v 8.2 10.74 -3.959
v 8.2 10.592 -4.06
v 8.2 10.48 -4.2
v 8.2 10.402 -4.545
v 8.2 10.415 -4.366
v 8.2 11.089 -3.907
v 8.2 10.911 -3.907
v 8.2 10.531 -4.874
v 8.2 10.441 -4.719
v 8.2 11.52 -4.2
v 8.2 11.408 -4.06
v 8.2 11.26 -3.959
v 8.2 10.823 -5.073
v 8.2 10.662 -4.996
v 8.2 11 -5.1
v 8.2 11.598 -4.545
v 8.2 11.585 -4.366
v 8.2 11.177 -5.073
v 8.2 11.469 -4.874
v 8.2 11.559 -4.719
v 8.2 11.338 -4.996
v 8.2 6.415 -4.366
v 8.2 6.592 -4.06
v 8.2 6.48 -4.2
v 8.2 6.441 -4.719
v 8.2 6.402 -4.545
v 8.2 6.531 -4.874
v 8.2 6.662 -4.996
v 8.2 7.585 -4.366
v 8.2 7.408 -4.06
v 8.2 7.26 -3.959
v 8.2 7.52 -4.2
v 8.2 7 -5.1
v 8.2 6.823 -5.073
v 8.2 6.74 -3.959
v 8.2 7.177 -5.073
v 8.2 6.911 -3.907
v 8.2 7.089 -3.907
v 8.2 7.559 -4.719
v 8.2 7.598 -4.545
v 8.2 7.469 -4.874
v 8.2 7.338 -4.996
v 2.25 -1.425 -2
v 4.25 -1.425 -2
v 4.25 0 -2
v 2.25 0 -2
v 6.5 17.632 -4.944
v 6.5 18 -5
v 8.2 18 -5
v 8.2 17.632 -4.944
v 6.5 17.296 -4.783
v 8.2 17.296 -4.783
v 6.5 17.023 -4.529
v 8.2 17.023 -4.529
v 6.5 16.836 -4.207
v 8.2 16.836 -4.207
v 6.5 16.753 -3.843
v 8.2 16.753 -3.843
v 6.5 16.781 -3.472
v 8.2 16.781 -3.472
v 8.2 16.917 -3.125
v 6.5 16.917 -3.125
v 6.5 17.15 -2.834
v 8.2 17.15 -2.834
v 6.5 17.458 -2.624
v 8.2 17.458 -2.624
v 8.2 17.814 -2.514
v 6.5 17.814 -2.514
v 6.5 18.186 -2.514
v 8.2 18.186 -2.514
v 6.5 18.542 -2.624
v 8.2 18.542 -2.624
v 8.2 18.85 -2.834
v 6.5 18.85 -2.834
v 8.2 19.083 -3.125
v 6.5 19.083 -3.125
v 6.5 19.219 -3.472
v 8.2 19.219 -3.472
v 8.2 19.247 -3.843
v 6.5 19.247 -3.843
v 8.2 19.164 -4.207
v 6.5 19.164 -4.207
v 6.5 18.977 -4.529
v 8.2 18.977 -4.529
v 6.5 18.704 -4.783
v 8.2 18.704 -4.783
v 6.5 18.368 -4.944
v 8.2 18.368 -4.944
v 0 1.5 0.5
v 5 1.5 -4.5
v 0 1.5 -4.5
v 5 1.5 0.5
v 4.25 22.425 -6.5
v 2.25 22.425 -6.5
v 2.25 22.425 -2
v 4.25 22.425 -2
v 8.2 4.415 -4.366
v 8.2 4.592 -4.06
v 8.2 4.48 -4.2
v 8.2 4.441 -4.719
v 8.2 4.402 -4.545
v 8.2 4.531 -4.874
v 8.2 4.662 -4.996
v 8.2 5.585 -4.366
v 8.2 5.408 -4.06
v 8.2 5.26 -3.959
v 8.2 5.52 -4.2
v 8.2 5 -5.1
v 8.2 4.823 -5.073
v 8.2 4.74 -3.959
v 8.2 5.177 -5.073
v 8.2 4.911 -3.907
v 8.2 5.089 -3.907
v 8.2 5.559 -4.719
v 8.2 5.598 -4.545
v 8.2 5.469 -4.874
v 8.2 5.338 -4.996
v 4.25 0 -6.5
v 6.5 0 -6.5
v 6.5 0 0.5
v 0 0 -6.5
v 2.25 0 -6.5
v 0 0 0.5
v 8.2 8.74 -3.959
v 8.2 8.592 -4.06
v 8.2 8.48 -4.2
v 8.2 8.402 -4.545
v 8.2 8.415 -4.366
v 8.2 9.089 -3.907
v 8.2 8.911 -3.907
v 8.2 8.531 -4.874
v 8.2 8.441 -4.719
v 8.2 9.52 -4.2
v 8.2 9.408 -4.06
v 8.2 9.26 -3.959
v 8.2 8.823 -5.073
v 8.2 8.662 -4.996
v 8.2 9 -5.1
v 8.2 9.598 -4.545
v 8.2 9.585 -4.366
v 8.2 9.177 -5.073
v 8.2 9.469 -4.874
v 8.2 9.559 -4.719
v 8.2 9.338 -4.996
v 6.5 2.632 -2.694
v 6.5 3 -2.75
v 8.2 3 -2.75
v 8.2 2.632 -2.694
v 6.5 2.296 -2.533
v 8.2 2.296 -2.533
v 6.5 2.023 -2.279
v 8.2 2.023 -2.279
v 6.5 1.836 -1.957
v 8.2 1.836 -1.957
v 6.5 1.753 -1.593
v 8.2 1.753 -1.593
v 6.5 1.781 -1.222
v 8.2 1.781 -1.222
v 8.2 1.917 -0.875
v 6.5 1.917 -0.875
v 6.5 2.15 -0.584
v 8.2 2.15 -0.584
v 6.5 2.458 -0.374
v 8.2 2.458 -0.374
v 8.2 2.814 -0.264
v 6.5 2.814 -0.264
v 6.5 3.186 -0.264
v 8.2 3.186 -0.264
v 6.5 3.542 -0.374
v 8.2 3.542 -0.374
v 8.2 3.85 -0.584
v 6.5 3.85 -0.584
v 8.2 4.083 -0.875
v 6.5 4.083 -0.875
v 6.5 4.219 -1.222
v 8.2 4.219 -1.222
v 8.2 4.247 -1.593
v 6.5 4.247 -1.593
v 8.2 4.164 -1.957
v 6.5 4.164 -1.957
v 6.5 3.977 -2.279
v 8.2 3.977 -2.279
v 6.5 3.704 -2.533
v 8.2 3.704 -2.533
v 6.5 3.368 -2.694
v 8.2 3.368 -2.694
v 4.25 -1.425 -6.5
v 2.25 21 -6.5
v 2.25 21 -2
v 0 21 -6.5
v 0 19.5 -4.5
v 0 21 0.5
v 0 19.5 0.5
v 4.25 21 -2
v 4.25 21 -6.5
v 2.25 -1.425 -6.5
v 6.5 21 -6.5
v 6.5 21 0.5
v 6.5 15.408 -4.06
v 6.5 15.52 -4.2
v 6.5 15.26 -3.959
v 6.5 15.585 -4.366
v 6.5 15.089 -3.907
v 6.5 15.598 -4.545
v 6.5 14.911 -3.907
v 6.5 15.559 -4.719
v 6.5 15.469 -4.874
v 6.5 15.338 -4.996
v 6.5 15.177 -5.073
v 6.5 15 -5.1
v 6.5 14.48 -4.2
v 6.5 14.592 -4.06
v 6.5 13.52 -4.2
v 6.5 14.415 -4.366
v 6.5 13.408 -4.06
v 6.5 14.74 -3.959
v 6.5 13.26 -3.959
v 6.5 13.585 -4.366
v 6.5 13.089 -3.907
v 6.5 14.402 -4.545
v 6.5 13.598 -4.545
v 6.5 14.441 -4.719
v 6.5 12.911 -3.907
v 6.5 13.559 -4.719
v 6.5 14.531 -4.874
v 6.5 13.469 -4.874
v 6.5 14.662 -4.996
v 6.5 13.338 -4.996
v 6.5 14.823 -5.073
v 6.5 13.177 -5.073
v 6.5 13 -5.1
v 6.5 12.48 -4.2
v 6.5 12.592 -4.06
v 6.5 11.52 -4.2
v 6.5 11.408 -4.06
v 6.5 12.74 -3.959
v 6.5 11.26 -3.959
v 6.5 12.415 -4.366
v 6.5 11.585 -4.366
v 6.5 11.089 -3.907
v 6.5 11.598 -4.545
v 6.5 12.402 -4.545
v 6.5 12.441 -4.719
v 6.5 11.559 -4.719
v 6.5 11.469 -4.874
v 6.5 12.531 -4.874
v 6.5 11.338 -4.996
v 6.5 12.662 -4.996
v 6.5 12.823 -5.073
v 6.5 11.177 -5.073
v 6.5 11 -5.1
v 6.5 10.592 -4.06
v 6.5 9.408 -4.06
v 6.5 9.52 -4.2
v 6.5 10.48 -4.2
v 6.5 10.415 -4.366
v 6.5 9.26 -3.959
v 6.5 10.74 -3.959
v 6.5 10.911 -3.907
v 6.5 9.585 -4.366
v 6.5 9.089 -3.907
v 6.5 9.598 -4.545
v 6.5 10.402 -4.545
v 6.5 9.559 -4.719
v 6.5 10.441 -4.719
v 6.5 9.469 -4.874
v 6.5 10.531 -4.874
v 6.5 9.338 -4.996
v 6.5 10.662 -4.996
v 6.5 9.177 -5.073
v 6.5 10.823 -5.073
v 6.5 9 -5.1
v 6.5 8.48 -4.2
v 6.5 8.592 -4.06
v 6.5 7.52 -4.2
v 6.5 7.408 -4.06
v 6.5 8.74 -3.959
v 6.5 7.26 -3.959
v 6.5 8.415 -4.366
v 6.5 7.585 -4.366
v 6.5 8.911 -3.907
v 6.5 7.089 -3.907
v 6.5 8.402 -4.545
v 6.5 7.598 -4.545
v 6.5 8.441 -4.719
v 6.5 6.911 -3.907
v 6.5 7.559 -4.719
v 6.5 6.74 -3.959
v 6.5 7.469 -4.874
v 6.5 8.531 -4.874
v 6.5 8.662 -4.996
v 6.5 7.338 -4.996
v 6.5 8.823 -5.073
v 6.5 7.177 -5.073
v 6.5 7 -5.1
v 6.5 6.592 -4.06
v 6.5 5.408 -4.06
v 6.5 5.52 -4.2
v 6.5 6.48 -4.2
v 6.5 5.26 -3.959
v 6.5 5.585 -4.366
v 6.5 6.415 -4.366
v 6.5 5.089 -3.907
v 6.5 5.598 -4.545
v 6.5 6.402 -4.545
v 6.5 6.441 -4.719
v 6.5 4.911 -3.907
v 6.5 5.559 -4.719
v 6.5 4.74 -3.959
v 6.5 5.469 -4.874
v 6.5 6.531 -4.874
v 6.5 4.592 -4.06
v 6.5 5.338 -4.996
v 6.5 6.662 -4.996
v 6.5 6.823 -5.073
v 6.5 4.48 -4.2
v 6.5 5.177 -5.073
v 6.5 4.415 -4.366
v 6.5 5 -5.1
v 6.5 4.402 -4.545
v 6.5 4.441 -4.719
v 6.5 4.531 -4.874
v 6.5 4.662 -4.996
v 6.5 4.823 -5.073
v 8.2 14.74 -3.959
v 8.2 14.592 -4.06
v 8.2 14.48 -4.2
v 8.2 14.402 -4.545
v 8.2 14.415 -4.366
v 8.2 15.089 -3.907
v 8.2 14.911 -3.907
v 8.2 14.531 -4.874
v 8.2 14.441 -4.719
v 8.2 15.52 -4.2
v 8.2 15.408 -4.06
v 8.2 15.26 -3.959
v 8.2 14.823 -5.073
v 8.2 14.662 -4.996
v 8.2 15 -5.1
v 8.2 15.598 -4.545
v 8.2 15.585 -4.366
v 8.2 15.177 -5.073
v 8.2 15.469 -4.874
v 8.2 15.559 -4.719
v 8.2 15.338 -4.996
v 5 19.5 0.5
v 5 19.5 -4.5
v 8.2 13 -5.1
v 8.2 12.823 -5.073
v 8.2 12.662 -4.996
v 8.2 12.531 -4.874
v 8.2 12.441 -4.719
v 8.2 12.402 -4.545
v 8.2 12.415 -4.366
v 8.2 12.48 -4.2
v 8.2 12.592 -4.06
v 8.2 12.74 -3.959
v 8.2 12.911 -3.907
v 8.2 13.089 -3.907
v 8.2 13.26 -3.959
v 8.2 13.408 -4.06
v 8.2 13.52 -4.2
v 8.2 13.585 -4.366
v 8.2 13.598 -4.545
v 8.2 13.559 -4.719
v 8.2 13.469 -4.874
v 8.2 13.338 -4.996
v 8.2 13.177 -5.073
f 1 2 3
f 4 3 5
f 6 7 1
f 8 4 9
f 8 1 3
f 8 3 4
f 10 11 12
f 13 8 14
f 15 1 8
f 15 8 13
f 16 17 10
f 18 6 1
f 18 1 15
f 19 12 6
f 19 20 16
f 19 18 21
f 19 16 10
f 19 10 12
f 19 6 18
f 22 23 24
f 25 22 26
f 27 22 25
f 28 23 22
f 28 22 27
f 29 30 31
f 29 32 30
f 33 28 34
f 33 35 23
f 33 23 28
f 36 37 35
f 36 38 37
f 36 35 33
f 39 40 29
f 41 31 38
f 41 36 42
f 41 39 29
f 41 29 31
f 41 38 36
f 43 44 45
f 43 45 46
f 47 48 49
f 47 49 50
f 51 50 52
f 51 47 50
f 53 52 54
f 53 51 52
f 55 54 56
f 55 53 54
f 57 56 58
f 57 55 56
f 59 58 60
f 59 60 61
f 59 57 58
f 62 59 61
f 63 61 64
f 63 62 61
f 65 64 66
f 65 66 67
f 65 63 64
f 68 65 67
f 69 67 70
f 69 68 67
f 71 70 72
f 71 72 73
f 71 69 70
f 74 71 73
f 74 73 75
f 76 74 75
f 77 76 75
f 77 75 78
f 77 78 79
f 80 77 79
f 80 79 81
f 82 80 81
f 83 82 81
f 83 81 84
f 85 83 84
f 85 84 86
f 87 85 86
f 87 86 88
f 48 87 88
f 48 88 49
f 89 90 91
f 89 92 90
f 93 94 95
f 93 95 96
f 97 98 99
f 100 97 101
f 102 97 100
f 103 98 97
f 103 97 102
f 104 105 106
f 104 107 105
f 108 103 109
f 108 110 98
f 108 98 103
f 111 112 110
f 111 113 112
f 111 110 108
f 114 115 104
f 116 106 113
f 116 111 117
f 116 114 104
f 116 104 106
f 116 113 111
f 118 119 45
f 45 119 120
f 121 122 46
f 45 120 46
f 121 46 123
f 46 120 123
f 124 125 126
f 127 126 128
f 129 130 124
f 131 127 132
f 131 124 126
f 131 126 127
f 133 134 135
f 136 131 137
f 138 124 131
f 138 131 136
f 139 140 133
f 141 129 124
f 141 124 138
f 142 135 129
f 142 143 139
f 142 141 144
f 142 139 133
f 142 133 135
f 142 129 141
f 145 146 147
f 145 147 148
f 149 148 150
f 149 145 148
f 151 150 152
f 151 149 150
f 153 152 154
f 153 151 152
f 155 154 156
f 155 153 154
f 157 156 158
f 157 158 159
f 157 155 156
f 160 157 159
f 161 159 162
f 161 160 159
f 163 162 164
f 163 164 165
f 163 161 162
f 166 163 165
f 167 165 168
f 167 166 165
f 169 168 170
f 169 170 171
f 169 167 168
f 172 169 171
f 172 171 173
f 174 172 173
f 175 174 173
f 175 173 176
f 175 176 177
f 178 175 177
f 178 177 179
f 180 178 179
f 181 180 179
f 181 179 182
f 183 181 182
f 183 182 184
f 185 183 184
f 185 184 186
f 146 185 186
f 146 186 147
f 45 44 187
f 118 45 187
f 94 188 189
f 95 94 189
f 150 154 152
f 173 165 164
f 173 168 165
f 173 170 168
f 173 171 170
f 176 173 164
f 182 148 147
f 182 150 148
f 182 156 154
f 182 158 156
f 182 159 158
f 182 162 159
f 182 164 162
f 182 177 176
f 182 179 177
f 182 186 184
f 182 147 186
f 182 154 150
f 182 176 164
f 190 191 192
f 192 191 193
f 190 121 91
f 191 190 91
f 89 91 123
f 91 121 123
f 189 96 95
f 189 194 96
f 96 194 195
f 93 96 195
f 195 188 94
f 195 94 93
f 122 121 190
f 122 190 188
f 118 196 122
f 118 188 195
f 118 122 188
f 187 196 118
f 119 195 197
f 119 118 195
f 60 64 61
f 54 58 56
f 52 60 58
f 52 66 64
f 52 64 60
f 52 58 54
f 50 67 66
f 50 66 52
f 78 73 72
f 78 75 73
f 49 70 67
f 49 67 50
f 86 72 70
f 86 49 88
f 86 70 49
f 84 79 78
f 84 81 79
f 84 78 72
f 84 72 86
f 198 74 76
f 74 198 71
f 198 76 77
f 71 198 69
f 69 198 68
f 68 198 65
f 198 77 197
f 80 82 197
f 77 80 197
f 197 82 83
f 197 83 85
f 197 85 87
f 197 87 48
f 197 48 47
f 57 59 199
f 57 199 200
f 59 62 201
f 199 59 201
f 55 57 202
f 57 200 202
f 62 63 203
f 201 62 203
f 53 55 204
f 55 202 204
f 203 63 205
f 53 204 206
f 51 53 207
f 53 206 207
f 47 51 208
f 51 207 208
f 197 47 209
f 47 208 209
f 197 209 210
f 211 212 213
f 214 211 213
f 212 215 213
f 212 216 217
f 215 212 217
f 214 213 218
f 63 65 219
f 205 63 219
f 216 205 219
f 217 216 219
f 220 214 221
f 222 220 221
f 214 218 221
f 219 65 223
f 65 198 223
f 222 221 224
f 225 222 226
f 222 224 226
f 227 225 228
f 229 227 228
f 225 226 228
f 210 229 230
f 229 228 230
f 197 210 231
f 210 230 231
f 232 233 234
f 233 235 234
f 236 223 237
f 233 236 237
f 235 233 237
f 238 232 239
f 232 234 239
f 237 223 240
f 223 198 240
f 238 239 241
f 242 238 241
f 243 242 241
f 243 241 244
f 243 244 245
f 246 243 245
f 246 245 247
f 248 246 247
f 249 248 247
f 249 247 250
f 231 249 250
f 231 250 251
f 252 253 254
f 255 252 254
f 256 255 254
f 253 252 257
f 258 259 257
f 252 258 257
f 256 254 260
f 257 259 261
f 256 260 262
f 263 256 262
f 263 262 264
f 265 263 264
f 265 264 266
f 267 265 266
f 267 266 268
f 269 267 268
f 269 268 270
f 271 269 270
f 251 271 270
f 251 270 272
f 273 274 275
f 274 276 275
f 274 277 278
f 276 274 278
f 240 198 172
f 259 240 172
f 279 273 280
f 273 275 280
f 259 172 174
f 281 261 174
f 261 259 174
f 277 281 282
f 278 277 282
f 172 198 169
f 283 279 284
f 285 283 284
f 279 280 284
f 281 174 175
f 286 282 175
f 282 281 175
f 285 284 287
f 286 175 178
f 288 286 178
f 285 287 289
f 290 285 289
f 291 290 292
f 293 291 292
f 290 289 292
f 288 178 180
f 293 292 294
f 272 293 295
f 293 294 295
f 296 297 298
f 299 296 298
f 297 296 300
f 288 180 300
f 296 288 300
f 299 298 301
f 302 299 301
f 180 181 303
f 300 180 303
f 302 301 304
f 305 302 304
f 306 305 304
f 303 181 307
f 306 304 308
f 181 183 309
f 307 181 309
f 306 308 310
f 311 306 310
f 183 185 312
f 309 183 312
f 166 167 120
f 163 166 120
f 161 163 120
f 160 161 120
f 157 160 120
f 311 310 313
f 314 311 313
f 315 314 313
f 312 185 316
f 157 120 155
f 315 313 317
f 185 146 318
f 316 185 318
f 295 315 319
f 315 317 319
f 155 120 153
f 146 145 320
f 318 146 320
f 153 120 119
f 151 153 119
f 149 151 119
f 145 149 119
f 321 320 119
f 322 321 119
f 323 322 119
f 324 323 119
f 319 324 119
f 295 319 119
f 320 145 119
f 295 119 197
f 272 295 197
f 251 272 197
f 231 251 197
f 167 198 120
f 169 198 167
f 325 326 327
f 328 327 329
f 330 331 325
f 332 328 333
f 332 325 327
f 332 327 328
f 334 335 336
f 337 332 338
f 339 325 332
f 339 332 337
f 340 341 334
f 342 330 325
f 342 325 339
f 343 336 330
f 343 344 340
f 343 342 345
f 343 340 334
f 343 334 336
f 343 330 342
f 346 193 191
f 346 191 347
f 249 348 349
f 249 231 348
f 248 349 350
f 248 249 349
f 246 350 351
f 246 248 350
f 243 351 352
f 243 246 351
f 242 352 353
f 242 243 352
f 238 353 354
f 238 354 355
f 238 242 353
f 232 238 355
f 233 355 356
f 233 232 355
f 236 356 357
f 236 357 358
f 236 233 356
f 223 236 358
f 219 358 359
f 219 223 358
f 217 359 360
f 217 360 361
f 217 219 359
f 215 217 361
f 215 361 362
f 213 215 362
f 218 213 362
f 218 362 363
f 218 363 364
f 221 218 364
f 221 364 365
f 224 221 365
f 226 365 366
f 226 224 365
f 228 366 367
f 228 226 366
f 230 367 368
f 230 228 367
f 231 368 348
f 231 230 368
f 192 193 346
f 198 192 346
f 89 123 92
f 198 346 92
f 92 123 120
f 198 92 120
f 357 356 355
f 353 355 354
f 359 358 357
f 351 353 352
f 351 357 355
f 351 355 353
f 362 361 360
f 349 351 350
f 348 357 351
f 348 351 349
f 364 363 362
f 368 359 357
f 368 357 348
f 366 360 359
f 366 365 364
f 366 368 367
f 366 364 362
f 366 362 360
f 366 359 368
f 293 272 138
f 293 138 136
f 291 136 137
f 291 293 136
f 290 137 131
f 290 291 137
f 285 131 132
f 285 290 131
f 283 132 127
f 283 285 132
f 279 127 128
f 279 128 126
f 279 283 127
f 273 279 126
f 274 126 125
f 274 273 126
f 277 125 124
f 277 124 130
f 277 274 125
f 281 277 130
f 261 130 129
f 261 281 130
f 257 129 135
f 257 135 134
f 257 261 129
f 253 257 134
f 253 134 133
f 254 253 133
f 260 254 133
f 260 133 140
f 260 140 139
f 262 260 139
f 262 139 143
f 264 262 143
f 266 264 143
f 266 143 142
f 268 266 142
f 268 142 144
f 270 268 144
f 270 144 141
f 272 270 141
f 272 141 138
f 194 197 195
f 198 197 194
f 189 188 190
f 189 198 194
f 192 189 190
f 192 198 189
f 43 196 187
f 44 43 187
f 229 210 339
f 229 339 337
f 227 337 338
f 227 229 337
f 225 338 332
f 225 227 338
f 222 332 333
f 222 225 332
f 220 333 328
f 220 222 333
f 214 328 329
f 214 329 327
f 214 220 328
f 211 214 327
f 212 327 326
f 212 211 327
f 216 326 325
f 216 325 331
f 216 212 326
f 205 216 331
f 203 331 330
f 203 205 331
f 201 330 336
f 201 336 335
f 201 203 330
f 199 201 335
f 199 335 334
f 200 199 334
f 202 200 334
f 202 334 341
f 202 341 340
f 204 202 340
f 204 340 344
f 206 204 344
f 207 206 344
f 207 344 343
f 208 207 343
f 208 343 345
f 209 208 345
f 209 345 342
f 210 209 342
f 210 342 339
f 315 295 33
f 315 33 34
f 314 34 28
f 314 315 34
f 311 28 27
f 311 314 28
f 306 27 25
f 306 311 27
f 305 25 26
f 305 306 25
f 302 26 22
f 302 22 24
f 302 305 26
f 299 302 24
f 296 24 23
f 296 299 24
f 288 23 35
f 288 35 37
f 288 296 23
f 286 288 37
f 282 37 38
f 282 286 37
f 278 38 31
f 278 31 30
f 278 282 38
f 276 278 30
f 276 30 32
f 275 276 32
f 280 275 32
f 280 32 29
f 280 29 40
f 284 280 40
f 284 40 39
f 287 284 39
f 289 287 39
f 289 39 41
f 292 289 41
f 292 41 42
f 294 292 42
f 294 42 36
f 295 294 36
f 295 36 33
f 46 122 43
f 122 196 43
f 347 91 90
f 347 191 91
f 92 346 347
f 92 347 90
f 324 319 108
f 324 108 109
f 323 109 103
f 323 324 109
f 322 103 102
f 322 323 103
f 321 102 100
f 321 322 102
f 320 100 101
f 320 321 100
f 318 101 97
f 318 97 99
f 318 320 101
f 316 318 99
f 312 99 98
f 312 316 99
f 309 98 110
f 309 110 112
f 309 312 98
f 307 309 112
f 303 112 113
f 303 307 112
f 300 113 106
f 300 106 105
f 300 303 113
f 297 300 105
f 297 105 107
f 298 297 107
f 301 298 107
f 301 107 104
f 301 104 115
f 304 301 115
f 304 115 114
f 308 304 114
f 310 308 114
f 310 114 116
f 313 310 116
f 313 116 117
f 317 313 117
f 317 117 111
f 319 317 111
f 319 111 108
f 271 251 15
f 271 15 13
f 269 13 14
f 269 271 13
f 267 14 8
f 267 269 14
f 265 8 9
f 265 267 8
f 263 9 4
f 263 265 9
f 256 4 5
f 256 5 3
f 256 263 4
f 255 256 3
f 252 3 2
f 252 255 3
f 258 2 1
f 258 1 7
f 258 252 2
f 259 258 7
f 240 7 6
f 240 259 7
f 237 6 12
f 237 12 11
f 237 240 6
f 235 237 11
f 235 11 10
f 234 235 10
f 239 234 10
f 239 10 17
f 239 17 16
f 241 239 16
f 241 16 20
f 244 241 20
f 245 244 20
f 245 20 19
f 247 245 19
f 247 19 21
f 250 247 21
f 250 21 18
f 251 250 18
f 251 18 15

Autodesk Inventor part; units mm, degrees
ref_plane "YZ Plane" through (0, 0, 0) normal (1, 0, 0) x (0, 1, 0)
ref_plane "XZ Plane" through (0, 0, 0) normal (0, 1, 0) x (-1, 0, 0)
ref_plane "XY Plane" through (0, 0, 0) normal (0, 0, 1) x (1, 0, 0)
sketch "Эскиз1" plane through (0, 0, 0) normal (0, 1, 0) x (-1, 0, 0)
  line L0 (0, -6.5) -> (-2.25, -6.5)
  line L1 (-2.25, -6.5) -> (-4.25, -6.5)
  line L2 (-2.25, -6.5) -> (-4.25, -6.5)
  line L3 (-6.5, -6.5) -> (-4.25, -6.5)
  line L4 (0, -6.5) -> (0, 0.5)
  line L5 (0, 0.5) -> (-6.5, 0.5)
  line L6 (-6.5, 0.5) -> (-6.5, -6.5)
  line L7 (-2.25, -6.5) -> (-2.25, -1.5)
  line L8 (-2.25, -1.5) -> (-4.25, -1.5)
  line L9 (-4.25, -1.5) -> (-4.25, -6.5)
  point P0 (0, 0)
  dimension "d2" = 2.25
  dimension "d4" = 2
  dimension "d31" = 7
  dimension "d32" = 5
extrude "Выдавливание1" add sketch "Эскиз1" along normal blind 21
sketch "Эскиз2" plane through (0, 21, 0) normal (0, 1, 0) x (1, 0, 0)
  line L0 (4.25, 2) -> (2.25, 2) projected
  line L1 (4.25, 6.5) -> (2.25, 6.5)
  line L2 (2.25, 6.5) -> (2.25, 2)
  line L3 (2.25, 2) -> (4.25, 2)
  line L4 (4.25, 2) -> (4.25, 6.5)
  point P0 (0, 0)
extrude "Выдавливание2" add sketch "Эскиз2" along normal blind 1.425 and the other way blind 22.425
sketch "Эскиз4" plane through (2.25, 0, -2) normal (0, 0, 1) x (1, 0, 0)
  line L0 (0, 22.425) -> (2, 22.425) projected
  line L1 (2, -1.425) -> (0, -1.425) projected
  line L2 (-2.25, 21) -> (4.75, 21) projected
  line L3 (-2.25, 0) -> (4.75, 0) projected
  line L4 (4.75, 0) -> (4.75, 21) projected
  line L5 (-2.25, 1) -> (-2.25, 20) projected
  line L6 (0, 22.425) -> (0, 21) projected
  line L7 (2, 21) -> (2, 22.425) projected
  dimension "d17" = 23.85
  dimension "d18" = 21
  dimension "d19" = 7
  dimension "d20" = 2.25
  dimension "d21" = 2
  dimension "d22" = 2.75
  dimension "d23" = 1.425
  dimension "d24" = 7
sketch "Эскиз6" plane through (0, 0, 0.5) normal (0, 0, 1) x (1, 0, 0)
  line L0 (0, 0) -> (0, 1.5)
  line L1 (0, 0) -> (0, 21) projected
  line L2 (0, 21) -> (6.5, 21) projected
  line L3 (0, 21) -> (0, 19.5)
  line L4 (0, 19.5) -> (5, 19.5)
  line L5 (5, 19.5) -> (5, 1.5)
  line L6 (5, 1.5) -> (0, 1.5)
  line L7 (0, 1.5) -> (0, 19.5)
  dimension "d33" = 1.5
  dimension "d34" = 1.5
  dimension "d35" = 5
extrude "Выдавливание5" cut sketch "Эскиз6" against normal blind 5
sketch "Эскиз7" plane through (6.5, 0, 0.5) normal (1, 0, 0) x (0, 0, -1)
  line L0 (7, 0) -> (7, 21) projected
  line L1 (7, 10.5) -> (7, 18)
  line L2 (7, 18) -> (7, 3)
  line L3 (0, 19.5) -> (0, 1.5) projected
  line L4 (0, 3) -> (7, 3)
  line L5 (0, 18) -> (7, 18)
  line L6 (7, 18) -> (4, 18)
  line L7 (4.5, 18) -> (4.5, 3)
  line L8 (4.5, 3) -> (2, 3)
  circle A0 centre (2, 3) radius 1.25
  circle A1 centre (4.25, 18) radius 1.25
  line L9 (5, 19.5) -> (5, 1.5) projected
  line L10 (5, 1.5) -> (5, 19.5) projected
  line L11 (5, 3) -> (5, 5)
  line L12 (5, 5) -> (5, 7)
  line L13 (5, 7) -> (5, 9)
  line L14 (5, 9) -> (5, 11)
  line L15 (5, 11) -> (5, 13)
  line L16 (5, 13) -> (5, 15)
  circle A2 centre (5, 5) radius 0.6
  circle A3 centre (5, 7) radius 0.6
  circle A4 centre (5, 9) radius 0.6
  circle A5 centre (5, 11) radius 0.6
  circle A6 centre (5, 13) radius 0.6
  circle A7 centre (5, 15) radius 0.6
  point P0 (0.5, 0)
  dimension "d38" = 7.5
  dimension "d39" = 15
  dimension "d40" = 3
  dimension "d41" = 0.5
  dimension "d42" = 2.5
  dimension "d43" = 2.5
  dimension "d44" = 2.5
  dimension "d61" = 2
  dimension "d62" = 2
  dimension "d63" = 2
  dimension "d64" = 2
  dimension "d65" = 2
  dimension "d66" = 2
  dimension "d68" = 1.2
  dimension "d69" = 1.2
  dimension "d70" = 1.2
  dimension "d71" = 1.2
  dimension "d72" = 1.2
  dimension "d73" = 1.2
extrude "Выдавливание6" add sketch "Эскиз7" along normal blind 1.7 contours A2 L7 L9 | L9 A2 | A1 L9 L5 | L5 L9 A1 | A0 L4 | L4 A0 | A2 L7 | L9 A1 L7 L5 | L5 A1 L9 | L7 A1 L5 | A7 L9 | L9 A7 L7 | A3 L7 | L7 A3 L9 | L9 A3 | L7 A7 | A4 L7 | L7 A4 L9 | A6 L9 L7 | L7 A6 | A6 L9 | L9 A4 | A5 L7 | L7 A5 L9 | L9 A5
properties part number "fast_battery"
